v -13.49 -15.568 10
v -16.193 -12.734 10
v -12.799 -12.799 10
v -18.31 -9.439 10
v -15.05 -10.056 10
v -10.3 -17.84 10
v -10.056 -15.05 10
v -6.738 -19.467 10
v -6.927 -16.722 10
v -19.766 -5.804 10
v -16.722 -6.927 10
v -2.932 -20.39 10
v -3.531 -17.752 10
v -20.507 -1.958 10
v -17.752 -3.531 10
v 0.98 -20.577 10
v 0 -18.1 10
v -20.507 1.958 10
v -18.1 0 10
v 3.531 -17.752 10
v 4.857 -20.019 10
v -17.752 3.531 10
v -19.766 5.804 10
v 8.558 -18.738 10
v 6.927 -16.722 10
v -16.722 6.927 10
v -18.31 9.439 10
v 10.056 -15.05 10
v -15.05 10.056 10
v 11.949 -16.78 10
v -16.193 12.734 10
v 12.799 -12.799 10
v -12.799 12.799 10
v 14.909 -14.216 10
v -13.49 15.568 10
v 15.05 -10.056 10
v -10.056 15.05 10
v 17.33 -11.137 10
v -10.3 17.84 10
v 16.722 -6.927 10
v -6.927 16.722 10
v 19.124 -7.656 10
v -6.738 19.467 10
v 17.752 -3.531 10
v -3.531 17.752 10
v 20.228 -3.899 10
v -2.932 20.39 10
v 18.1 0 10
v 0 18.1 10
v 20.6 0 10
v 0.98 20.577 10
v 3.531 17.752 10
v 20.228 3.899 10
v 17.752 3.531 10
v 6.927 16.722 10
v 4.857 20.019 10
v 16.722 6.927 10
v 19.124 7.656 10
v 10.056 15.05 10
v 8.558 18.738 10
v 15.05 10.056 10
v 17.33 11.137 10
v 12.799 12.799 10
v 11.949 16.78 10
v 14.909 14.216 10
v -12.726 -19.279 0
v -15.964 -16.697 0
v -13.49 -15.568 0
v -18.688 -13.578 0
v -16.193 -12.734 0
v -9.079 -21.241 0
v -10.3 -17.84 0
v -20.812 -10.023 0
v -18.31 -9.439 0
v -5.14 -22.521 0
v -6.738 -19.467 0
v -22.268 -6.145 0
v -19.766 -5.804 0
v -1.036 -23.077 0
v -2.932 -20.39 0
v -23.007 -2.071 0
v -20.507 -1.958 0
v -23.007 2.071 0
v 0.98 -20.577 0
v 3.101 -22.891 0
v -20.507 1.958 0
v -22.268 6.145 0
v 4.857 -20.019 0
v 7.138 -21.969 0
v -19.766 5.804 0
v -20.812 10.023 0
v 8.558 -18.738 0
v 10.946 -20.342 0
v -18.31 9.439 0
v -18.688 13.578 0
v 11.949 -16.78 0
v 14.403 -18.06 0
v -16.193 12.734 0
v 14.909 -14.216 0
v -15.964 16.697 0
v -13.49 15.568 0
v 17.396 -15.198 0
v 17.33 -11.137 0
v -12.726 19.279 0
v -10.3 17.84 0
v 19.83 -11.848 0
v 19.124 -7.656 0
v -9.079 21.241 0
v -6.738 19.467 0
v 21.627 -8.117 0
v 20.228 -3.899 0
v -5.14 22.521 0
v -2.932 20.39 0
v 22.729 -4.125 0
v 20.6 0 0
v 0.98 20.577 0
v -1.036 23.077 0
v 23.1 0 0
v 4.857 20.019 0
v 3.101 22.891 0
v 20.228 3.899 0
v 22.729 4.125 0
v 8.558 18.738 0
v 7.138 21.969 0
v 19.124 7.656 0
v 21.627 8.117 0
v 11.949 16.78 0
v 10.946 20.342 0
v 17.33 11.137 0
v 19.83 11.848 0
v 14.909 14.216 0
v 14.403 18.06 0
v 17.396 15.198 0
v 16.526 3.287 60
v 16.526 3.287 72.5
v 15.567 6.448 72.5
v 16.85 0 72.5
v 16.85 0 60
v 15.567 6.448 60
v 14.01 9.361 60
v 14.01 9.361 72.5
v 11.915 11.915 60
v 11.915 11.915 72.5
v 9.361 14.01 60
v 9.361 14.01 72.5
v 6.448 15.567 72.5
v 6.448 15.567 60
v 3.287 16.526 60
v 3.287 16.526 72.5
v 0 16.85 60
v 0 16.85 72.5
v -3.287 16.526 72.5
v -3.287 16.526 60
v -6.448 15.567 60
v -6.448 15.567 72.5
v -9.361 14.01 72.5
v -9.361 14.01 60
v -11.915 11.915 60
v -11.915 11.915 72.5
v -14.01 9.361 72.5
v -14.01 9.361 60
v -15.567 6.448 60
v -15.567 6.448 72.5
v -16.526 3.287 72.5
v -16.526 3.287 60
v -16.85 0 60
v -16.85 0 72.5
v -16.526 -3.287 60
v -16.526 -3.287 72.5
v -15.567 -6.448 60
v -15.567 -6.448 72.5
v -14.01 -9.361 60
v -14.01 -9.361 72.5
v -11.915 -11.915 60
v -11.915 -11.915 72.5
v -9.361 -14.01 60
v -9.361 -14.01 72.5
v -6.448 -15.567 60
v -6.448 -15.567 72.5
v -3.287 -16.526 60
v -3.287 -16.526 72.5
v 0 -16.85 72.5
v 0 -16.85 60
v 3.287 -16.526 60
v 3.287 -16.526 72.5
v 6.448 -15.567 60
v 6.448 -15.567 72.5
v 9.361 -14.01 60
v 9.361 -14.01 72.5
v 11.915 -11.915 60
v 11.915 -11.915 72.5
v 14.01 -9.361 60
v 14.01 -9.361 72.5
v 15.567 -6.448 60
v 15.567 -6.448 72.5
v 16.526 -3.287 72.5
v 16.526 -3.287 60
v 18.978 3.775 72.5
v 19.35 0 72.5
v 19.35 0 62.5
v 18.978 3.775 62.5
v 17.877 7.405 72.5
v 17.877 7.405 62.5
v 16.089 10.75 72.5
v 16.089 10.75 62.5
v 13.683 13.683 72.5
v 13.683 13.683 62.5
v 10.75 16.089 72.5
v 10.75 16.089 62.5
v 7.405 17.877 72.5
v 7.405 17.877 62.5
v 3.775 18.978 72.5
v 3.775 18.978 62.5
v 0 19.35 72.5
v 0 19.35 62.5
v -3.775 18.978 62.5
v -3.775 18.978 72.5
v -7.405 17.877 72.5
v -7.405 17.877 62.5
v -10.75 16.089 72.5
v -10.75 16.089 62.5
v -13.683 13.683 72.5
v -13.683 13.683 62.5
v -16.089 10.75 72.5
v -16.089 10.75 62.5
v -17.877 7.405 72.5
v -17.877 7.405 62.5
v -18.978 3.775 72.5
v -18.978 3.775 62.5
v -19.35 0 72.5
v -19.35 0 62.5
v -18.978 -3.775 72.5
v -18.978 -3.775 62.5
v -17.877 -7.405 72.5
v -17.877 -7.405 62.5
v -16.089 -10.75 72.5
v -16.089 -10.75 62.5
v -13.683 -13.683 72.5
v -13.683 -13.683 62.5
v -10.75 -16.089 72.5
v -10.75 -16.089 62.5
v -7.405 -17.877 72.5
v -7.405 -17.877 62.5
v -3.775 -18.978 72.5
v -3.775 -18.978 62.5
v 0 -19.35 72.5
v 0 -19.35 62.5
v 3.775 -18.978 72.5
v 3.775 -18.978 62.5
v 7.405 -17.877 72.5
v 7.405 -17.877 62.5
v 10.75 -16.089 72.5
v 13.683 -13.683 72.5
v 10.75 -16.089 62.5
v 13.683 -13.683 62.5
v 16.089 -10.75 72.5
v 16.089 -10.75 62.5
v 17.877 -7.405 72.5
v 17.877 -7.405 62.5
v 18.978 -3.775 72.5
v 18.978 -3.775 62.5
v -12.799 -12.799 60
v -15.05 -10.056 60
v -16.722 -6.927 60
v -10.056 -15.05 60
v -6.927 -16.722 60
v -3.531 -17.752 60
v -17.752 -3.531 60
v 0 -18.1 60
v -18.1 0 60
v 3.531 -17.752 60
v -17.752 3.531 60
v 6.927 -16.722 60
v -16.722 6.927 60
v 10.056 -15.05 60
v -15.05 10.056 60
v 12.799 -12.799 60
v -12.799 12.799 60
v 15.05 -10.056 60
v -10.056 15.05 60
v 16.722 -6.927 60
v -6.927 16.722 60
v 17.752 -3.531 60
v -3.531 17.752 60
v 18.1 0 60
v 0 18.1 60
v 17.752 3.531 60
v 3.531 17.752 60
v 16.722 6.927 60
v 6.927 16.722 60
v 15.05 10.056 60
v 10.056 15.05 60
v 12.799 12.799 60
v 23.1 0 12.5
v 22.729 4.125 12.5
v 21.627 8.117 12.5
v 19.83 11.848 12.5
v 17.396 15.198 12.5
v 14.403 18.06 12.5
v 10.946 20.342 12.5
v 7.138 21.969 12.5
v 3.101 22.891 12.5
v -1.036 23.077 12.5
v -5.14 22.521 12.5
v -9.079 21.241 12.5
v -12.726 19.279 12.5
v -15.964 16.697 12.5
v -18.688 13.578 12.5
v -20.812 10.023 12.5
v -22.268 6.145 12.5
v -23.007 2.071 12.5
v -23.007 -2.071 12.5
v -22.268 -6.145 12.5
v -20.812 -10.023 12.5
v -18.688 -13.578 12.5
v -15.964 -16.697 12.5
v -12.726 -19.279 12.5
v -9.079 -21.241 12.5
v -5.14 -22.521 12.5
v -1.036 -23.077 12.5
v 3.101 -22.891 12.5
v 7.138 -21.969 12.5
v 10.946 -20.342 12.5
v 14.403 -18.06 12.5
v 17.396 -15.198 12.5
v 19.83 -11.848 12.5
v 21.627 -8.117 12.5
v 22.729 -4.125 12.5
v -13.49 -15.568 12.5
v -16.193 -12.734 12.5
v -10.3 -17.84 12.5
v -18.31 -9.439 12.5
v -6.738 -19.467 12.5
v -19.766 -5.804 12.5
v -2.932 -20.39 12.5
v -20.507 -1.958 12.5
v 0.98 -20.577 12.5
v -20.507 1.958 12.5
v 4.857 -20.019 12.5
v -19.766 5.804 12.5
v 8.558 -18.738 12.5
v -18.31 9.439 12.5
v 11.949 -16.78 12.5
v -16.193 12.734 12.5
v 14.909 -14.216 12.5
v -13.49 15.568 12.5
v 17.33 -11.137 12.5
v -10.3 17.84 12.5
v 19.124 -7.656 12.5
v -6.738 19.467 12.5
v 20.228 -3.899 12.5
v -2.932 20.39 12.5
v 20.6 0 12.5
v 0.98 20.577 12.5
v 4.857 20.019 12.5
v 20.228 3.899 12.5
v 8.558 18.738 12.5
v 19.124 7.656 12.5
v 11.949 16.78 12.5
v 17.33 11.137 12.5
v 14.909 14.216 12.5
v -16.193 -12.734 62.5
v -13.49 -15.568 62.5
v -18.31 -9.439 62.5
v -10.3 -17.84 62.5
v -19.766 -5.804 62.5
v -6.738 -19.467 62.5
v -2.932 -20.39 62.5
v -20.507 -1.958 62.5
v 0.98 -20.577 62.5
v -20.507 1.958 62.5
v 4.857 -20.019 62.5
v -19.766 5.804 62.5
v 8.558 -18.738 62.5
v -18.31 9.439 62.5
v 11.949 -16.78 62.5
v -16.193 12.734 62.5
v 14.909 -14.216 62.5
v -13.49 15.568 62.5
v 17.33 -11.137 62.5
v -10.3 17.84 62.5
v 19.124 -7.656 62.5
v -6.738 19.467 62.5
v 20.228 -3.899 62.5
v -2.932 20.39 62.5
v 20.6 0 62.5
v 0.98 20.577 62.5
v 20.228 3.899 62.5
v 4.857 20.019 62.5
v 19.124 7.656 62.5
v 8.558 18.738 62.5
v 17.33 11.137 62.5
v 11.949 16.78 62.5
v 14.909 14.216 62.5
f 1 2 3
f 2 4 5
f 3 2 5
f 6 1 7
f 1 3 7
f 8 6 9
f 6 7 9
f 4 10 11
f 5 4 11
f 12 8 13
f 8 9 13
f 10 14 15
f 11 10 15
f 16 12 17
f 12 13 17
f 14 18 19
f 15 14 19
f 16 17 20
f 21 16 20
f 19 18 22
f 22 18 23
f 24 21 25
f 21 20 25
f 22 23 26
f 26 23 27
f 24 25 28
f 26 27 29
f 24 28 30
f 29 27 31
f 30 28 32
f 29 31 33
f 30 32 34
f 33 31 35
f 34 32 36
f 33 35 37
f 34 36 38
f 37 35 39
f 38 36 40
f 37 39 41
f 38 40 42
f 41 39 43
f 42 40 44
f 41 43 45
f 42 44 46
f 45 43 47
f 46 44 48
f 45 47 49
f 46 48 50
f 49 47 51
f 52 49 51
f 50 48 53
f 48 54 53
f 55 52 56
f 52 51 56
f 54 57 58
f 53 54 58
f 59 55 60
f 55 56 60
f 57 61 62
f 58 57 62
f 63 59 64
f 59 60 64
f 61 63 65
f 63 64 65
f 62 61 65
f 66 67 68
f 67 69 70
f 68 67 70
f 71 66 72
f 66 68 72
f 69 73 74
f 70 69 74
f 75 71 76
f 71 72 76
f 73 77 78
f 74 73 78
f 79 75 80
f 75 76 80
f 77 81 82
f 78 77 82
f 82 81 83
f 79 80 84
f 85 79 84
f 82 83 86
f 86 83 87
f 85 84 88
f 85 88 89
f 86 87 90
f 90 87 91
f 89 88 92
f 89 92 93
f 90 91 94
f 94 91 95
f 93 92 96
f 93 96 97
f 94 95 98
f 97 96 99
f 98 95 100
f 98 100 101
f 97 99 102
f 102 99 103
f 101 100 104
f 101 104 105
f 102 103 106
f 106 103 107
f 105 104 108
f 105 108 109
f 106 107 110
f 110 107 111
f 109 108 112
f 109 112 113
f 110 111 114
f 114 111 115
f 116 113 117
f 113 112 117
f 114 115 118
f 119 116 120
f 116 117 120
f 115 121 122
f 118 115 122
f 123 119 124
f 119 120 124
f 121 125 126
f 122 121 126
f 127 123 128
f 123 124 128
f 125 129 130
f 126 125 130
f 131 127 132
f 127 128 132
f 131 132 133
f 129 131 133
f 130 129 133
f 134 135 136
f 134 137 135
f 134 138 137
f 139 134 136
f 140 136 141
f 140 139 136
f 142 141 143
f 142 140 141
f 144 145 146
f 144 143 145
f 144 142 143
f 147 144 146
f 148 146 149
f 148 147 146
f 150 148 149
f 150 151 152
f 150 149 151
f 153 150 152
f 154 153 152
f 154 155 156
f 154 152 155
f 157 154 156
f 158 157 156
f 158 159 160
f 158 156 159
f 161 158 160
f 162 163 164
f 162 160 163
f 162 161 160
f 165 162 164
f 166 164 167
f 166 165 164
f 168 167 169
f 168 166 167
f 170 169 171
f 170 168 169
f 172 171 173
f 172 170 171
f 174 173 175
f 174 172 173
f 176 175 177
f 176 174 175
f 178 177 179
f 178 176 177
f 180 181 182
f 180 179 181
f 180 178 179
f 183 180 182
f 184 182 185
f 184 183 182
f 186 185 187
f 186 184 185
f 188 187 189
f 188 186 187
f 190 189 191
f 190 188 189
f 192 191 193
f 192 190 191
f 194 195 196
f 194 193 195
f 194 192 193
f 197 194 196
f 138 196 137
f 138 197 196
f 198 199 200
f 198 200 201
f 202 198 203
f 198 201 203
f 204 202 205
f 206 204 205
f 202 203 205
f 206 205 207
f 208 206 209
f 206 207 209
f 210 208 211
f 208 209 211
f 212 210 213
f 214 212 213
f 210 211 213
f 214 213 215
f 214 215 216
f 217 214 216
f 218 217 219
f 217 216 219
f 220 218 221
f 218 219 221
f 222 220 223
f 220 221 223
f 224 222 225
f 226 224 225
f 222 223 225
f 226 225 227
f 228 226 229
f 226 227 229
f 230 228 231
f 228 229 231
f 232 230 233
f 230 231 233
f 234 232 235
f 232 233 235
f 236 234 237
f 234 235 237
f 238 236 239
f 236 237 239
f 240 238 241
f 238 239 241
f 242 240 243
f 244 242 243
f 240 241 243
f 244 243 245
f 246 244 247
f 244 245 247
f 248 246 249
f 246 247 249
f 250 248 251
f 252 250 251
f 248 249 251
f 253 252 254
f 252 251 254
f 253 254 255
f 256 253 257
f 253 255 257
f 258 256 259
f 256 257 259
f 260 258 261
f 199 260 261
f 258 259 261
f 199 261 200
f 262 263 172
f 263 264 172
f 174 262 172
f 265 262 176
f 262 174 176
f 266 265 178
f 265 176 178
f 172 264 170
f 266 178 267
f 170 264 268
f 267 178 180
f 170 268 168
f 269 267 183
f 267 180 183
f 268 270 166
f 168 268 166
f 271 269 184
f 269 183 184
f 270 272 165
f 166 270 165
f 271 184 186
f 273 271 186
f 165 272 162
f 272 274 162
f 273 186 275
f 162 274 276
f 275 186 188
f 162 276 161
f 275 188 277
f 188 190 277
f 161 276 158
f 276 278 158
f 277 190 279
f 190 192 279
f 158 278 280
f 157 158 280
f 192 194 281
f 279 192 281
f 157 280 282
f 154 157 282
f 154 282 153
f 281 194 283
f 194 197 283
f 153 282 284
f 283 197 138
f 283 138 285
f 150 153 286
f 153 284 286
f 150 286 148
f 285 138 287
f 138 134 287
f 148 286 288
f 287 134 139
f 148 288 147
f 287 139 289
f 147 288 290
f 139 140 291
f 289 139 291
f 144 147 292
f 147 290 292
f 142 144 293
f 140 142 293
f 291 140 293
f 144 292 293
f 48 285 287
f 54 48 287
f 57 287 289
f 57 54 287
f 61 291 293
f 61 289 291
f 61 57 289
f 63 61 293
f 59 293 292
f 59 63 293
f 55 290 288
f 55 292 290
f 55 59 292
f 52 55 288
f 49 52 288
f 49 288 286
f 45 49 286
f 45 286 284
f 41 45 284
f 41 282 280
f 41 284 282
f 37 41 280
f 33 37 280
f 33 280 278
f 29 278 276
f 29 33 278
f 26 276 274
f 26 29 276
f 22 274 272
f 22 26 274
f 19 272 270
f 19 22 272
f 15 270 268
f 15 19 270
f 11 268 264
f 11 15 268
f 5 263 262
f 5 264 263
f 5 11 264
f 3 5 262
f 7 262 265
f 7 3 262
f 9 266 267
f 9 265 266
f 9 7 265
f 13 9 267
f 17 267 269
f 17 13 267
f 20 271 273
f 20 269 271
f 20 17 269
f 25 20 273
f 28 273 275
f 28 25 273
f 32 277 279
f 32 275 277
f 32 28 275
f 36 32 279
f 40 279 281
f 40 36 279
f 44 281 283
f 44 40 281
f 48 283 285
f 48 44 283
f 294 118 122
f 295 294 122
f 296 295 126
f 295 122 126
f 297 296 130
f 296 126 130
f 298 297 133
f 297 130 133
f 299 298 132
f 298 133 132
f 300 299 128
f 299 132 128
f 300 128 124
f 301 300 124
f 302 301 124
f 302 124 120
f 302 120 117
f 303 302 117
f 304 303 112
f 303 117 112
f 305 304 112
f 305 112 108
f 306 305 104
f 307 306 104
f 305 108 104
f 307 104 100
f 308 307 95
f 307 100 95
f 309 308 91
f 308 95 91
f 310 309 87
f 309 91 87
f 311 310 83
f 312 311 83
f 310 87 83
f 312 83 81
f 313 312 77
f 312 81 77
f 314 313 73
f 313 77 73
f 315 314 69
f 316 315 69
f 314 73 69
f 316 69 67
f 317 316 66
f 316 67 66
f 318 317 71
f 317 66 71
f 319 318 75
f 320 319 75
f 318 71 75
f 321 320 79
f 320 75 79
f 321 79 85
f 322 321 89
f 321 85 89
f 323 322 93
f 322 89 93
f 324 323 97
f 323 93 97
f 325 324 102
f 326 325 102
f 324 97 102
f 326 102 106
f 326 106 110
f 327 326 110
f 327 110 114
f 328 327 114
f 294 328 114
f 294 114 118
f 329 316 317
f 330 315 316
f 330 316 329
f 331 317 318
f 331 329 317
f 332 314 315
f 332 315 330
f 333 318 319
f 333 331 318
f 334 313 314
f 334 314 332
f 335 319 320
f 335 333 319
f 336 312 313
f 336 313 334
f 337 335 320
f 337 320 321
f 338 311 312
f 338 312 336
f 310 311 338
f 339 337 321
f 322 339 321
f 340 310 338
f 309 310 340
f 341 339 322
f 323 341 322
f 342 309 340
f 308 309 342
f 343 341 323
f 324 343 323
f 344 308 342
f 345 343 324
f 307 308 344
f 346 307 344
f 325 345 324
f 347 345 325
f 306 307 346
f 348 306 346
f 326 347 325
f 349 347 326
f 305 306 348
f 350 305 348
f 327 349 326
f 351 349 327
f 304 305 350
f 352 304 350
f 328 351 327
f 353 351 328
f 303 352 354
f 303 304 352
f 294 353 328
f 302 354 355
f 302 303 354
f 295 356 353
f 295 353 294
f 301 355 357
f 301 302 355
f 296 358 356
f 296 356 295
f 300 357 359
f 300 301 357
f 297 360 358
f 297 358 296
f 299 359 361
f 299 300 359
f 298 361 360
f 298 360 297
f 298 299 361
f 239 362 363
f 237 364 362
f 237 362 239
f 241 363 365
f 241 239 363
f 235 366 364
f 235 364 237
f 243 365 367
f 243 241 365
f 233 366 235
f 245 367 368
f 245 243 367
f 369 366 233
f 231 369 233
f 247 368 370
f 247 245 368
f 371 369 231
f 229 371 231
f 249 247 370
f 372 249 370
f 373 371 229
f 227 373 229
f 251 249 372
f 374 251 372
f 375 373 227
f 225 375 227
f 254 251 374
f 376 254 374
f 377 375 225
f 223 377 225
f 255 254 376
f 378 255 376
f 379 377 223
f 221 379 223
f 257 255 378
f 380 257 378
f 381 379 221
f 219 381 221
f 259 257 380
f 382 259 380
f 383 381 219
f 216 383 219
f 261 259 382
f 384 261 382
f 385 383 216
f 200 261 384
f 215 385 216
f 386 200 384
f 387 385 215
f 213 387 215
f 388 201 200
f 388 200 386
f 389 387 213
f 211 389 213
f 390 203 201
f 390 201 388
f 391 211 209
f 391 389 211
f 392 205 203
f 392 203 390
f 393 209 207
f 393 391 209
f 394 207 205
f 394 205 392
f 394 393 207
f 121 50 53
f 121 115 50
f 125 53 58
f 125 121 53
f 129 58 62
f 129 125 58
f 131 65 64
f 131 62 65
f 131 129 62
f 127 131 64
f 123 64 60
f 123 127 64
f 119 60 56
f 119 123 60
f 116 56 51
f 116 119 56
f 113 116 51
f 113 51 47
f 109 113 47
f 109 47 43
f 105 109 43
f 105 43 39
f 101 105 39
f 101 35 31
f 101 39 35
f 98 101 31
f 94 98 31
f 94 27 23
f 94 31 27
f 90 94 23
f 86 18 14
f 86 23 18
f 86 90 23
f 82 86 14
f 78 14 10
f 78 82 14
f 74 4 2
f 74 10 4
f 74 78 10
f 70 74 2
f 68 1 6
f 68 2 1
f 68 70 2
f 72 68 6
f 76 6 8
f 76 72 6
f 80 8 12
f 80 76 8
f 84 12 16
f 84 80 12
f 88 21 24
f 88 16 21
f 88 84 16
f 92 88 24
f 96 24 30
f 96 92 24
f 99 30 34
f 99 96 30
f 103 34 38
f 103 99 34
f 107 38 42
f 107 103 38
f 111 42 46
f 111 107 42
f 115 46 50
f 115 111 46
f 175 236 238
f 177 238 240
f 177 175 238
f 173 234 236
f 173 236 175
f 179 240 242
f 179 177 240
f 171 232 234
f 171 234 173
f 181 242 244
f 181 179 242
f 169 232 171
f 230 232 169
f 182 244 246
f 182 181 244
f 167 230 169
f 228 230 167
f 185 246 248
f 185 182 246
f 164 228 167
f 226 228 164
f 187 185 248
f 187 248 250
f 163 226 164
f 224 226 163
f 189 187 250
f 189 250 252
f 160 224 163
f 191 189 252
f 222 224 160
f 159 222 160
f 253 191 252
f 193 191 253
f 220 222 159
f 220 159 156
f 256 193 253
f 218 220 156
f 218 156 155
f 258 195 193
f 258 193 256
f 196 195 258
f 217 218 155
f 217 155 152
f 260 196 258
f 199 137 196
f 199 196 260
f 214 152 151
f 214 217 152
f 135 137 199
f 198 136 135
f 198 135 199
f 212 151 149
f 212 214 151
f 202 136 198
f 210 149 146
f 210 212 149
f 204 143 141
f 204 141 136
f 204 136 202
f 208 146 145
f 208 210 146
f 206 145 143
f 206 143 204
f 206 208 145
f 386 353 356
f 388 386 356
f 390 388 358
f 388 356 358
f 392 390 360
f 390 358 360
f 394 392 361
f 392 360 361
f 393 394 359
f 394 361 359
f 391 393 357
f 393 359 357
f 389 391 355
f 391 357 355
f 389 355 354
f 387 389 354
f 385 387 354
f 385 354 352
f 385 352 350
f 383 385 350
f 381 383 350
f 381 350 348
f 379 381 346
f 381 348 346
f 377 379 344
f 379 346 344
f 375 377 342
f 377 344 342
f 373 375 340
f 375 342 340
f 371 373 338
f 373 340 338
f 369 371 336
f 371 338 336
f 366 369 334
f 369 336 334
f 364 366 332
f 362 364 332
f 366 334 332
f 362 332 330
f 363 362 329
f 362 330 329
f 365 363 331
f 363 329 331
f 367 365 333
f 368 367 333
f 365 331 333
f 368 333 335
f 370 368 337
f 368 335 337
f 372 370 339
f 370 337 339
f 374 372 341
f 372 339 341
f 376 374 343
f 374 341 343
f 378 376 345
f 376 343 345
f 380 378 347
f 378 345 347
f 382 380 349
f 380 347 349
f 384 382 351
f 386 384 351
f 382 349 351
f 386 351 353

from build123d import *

# Parameters (mm, degrees)
F0_R     = 23.1
F1_DEPTH = 12.5
F2_R     = 20.6
F3_DEPTH = 50
F4_R     = 19.35
F5_DEPTH = 10
F6_T     = -2.5


with BuildPart() as f1:
    # F0 (on Top) → F1 (new body)
    with BuildSketch(Plane.XY):
        Circle(F0_R)
    extrude(amount=F1_DEPTH)

    # F2 (on face) → F3 (join)
    with BuildSketch(Plane.XY.offset(12.5)):
        Circle(F2_R)
    extrude(amount=F3_DEPTH)

    # F4 (on face) → F5 (join)
    with BuildSketch(Plane.XY.offset(62.5)):
        Circle(F4_R)
    extrude(amount=F5_DEPTH)

    # F6
    f6_openings = [f1.faces().sort_by_distance(p)[0] for p in [
        (0, 0, 72.5),
        (0, 0, 0),
    ]]
    offset(amount=F6_T, openings=f6_openings, kind=Kind.INTERSECTION)


solid = f1.part
